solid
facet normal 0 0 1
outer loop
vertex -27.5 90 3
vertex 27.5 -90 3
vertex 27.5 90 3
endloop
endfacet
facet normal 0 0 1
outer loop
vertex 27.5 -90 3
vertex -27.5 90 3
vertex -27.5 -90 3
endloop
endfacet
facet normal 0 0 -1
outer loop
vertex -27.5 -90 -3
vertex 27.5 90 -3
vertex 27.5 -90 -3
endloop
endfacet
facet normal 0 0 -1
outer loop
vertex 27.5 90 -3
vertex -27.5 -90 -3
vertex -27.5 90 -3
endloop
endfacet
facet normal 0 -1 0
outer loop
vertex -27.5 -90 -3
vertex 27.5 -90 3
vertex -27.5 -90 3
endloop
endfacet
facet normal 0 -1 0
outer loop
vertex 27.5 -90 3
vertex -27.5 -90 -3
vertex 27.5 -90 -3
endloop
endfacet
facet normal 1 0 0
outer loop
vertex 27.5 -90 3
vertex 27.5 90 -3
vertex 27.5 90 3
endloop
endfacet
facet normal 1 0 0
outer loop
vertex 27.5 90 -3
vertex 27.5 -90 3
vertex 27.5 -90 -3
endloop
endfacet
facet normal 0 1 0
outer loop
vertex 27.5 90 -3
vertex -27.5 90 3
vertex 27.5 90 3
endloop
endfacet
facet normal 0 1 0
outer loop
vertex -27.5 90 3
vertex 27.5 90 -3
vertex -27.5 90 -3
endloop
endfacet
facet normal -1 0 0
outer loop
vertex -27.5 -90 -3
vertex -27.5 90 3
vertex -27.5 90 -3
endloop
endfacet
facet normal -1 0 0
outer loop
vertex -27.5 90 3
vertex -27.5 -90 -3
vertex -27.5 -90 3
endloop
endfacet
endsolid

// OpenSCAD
// ========================================
// a 55 x 180 x 6 mm plate
// NeuroCAD canonical IR; dimensions are millimetres
// ========================================
$fn = 48;

cube(size=[55, 180, 6], center=true);
